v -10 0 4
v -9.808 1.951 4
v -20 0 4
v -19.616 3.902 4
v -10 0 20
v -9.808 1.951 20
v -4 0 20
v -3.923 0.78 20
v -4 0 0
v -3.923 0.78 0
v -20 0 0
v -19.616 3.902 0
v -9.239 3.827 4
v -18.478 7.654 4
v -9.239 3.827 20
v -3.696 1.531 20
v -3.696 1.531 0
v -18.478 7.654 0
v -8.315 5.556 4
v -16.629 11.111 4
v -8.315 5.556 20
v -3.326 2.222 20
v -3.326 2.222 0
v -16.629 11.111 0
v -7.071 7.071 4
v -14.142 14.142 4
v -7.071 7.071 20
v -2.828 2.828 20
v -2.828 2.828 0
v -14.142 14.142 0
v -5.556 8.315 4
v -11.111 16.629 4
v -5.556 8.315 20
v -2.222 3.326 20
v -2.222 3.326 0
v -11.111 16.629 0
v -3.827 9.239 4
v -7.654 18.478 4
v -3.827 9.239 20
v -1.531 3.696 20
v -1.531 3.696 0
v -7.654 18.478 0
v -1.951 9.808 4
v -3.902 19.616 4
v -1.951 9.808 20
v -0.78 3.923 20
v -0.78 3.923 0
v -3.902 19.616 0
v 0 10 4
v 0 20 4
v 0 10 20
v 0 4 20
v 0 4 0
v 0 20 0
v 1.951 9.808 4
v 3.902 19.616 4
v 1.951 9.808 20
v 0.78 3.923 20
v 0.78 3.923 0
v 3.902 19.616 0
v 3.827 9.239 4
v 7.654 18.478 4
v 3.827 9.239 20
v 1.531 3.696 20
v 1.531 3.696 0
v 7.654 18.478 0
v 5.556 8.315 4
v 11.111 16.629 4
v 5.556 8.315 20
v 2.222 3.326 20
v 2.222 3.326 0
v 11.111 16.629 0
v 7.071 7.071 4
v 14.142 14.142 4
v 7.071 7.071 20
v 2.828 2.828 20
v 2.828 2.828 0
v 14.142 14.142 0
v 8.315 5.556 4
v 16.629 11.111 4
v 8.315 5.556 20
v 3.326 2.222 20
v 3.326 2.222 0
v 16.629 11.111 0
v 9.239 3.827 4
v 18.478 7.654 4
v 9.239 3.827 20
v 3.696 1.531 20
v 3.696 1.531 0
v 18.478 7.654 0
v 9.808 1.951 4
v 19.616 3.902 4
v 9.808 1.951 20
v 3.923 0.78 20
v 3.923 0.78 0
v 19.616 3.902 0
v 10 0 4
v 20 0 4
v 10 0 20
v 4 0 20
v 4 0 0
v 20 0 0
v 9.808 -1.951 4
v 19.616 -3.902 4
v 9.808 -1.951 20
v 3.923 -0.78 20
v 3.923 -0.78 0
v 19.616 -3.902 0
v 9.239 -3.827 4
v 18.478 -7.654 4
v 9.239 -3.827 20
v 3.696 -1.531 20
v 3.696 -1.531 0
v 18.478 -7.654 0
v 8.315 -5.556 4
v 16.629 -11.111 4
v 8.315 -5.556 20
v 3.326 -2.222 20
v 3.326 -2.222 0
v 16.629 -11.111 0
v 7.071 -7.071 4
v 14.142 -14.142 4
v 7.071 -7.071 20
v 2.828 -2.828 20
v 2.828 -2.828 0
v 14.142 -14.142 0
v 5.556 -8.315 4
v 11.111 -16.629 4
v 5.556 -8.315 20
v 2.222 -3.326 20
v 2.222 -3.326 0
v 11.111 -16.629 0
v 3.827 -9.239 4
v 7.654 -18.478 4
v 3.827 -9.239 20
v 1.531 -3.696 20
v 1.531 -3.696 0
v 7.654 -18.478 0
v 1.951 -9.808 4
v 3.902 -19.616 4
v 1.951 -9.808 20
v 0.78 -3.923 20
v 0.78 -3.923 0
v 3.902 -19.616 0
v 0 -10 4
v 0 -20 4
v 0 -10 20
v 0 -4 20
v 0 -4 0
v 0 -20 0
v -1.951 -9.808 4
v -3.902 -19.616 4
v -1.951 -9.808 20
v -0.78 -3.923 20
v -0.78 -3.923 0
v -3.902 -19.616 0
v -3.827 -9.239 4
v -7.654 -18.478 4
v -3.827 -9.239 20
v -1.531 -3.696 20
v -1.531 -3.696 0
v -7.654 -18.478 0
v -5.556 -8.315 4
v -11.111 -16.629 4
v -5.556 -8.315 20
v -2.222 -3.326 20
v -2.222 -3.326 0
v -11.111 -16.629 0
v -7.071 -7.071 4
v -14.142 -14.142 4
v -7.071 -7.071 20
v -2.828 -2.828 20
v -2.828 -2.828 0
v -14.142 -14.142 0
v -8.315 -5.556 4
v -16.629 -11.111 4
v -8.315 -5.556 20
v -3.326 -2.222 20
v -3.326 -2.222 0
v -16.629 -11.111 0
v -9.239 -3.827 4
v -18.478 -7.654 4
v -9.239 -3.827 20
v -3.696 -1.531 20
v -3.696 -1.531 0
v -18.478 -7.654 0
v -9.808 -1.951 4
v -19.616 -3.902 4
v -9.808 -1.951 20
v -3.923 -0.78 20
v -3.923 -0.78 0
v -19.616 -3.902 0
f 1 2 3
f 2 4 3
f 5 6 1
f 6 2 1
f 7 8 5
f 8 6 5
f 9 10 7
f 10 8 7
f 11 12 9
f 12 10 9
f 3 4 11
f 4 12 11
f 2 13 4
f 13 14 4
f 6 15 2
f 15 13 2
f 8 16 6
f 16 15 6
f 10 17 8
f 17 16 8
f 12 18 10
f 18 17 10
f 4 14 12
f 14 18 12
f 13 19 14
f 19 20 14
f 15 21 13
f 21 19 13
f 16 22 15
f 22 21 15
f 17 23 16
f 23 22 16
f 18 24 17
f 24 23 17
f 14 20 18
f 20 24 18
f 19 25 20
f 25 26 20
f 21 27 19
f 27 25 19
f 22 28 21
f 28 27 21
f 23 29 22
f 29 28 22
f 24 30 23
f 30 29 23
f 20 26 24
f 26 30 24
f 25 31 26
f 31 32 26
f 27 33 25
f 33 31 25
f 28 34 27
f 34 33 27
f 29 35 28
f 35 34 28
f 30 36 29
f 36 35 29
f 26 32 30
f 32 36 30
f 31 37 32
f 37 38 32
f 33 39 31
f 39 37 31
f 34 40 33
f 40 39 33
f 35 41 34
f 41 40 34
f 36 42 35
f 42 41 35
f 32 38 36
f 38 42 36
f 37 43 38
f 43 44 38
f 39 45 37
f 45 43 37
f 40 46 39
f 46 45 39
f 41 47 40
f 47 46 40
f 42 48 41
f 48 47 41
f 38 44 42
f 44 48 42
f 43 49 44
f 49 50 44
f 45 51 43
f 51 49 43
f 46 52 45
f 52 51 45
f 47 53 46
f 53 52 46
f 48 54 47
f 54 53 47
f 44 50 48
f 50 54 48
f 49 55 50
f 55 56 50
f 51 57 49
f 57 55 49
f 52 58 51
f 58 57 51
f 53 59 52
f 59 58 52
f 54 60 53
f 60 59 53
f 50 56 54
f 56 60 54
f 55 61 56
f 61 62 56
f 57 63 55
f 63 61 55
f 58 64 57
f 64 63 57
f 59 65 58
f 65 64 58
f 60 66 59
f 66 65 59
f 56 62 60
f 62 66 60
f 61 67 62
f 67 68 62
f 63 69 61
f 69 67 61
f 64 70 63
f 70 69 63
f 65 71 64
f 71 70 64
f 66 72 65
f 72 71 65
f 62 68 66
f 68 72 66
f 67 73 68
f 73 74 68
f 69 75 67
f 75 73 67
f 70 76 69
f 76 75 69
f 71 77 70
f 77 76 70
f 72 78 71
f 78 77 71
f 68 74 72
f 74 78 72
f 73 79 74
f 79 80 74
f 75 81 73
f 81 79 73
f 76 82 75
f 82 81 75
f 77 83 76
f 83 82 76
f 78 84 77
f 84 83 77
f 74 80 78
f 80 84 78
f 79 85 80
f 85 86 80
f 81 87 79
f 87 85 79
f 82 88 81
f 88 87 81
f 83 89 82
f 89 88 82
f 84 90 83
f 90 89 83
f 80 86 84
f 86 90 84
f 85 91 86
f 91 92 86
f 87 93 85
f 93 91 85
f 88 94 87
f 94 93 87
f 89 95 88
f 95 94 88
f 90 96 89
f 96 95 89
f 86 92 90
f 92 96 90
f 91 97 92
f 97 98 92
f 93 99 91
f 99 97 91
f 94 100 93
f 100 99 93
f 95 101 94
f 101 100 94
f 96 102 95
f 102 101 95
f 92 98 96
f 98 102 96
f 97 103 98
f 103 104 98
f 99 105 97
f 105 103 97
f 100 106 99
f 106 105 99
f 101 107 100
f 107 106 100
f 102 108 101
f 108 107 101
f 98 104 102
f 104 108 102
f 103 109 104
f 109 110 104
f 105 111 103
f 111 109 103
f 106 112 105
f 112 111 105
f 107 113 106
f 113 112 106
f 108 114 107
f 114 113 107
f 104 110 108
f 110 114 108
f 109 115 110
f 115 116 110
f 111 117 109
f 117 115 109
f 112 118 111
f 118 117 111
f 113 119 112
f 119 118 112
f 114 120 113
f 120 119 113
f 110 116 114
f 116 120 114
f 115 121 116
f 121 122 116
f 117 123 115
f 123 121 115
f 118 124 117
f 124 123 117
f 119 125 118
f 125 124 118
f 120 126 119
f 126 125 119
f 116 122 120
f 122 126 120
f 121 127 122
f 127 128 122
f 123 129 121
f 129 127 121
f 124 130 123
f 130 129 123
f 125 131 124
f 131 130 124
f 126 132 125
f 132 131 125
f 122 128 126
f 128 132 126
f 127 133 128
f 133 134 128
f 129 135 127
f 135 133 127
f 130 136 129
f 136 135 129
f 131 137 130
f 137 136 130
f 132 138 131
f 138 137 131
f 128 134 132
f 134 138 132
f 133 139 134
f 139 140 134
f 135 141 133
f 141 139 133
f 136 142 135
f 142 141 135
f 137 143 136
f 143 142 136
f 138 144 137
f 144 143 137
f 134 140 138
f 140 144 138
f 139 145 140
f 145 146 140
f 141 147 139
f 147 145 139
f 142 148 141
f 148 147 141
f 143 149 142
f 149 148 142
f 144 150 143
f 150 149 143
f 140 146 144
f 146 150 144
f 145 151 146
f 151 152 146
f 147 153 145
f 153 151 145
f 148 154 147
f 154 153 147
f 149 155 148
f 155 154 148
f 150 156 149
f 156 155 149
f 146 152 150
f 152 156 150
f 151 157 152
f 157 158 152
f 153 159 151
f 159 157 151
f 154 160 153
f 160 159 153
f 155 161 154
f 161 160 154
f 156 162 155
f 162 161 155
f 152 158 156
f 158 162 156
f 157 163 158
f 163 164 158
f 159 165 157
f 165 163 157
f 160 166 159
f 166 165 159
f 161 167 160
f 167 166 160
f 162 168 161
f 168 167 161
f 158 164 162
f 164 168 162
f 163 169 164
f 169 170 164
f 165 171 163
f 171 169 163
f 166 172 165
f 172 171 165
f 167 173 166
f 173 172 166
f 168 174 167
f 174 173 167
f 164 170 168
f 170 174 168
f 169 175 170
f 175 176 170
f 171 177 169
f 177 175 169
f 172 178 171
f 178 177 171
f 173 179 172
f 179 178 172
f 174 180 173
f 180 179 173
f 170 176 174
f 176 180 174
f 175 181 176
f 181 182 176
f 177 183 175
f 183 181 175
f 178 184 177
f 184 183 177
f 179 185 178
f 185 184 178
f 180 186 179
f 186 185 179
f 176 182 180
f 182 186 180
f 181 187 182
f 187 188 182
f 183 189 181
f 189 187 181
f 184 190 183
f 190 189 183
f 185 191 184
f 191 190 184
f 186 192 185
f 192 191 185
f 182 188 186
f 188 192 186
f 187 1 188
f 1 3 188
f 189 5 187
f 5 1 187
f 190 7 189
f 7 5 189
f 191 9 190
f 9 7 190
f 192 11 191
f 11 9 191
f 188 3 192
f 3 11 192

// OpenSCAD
$fn = 32;

// ----------------------------------------------------------------------
// Revolved part: flanged bushing R20
// ----------------------------------------------------------------------

// --- parameters (mm) ---
bore_r = 4;               // bore radius
flange_r = 20;            // flange radius
flange_h = 4;             // flange thickness
sleeve_r = 10;            // sleeve radius
total_h = 20;             // overall height
revolve_angle = 360;      // revolve sweep, degrees

bore_d = 2 * bore_r;
flange_d = 2 * flange_r;
sleeve_d = 2 * sleeve_r;

profile = [[4, 0], [20, 0], [20, 4], [10, 4], [10, 20], [4, 20]];  // primary outline, 6 points, counter clockwise

// --- the one profile operation ---
rotate_extrude(angle = revolve_angle) polygon(points = profile);
